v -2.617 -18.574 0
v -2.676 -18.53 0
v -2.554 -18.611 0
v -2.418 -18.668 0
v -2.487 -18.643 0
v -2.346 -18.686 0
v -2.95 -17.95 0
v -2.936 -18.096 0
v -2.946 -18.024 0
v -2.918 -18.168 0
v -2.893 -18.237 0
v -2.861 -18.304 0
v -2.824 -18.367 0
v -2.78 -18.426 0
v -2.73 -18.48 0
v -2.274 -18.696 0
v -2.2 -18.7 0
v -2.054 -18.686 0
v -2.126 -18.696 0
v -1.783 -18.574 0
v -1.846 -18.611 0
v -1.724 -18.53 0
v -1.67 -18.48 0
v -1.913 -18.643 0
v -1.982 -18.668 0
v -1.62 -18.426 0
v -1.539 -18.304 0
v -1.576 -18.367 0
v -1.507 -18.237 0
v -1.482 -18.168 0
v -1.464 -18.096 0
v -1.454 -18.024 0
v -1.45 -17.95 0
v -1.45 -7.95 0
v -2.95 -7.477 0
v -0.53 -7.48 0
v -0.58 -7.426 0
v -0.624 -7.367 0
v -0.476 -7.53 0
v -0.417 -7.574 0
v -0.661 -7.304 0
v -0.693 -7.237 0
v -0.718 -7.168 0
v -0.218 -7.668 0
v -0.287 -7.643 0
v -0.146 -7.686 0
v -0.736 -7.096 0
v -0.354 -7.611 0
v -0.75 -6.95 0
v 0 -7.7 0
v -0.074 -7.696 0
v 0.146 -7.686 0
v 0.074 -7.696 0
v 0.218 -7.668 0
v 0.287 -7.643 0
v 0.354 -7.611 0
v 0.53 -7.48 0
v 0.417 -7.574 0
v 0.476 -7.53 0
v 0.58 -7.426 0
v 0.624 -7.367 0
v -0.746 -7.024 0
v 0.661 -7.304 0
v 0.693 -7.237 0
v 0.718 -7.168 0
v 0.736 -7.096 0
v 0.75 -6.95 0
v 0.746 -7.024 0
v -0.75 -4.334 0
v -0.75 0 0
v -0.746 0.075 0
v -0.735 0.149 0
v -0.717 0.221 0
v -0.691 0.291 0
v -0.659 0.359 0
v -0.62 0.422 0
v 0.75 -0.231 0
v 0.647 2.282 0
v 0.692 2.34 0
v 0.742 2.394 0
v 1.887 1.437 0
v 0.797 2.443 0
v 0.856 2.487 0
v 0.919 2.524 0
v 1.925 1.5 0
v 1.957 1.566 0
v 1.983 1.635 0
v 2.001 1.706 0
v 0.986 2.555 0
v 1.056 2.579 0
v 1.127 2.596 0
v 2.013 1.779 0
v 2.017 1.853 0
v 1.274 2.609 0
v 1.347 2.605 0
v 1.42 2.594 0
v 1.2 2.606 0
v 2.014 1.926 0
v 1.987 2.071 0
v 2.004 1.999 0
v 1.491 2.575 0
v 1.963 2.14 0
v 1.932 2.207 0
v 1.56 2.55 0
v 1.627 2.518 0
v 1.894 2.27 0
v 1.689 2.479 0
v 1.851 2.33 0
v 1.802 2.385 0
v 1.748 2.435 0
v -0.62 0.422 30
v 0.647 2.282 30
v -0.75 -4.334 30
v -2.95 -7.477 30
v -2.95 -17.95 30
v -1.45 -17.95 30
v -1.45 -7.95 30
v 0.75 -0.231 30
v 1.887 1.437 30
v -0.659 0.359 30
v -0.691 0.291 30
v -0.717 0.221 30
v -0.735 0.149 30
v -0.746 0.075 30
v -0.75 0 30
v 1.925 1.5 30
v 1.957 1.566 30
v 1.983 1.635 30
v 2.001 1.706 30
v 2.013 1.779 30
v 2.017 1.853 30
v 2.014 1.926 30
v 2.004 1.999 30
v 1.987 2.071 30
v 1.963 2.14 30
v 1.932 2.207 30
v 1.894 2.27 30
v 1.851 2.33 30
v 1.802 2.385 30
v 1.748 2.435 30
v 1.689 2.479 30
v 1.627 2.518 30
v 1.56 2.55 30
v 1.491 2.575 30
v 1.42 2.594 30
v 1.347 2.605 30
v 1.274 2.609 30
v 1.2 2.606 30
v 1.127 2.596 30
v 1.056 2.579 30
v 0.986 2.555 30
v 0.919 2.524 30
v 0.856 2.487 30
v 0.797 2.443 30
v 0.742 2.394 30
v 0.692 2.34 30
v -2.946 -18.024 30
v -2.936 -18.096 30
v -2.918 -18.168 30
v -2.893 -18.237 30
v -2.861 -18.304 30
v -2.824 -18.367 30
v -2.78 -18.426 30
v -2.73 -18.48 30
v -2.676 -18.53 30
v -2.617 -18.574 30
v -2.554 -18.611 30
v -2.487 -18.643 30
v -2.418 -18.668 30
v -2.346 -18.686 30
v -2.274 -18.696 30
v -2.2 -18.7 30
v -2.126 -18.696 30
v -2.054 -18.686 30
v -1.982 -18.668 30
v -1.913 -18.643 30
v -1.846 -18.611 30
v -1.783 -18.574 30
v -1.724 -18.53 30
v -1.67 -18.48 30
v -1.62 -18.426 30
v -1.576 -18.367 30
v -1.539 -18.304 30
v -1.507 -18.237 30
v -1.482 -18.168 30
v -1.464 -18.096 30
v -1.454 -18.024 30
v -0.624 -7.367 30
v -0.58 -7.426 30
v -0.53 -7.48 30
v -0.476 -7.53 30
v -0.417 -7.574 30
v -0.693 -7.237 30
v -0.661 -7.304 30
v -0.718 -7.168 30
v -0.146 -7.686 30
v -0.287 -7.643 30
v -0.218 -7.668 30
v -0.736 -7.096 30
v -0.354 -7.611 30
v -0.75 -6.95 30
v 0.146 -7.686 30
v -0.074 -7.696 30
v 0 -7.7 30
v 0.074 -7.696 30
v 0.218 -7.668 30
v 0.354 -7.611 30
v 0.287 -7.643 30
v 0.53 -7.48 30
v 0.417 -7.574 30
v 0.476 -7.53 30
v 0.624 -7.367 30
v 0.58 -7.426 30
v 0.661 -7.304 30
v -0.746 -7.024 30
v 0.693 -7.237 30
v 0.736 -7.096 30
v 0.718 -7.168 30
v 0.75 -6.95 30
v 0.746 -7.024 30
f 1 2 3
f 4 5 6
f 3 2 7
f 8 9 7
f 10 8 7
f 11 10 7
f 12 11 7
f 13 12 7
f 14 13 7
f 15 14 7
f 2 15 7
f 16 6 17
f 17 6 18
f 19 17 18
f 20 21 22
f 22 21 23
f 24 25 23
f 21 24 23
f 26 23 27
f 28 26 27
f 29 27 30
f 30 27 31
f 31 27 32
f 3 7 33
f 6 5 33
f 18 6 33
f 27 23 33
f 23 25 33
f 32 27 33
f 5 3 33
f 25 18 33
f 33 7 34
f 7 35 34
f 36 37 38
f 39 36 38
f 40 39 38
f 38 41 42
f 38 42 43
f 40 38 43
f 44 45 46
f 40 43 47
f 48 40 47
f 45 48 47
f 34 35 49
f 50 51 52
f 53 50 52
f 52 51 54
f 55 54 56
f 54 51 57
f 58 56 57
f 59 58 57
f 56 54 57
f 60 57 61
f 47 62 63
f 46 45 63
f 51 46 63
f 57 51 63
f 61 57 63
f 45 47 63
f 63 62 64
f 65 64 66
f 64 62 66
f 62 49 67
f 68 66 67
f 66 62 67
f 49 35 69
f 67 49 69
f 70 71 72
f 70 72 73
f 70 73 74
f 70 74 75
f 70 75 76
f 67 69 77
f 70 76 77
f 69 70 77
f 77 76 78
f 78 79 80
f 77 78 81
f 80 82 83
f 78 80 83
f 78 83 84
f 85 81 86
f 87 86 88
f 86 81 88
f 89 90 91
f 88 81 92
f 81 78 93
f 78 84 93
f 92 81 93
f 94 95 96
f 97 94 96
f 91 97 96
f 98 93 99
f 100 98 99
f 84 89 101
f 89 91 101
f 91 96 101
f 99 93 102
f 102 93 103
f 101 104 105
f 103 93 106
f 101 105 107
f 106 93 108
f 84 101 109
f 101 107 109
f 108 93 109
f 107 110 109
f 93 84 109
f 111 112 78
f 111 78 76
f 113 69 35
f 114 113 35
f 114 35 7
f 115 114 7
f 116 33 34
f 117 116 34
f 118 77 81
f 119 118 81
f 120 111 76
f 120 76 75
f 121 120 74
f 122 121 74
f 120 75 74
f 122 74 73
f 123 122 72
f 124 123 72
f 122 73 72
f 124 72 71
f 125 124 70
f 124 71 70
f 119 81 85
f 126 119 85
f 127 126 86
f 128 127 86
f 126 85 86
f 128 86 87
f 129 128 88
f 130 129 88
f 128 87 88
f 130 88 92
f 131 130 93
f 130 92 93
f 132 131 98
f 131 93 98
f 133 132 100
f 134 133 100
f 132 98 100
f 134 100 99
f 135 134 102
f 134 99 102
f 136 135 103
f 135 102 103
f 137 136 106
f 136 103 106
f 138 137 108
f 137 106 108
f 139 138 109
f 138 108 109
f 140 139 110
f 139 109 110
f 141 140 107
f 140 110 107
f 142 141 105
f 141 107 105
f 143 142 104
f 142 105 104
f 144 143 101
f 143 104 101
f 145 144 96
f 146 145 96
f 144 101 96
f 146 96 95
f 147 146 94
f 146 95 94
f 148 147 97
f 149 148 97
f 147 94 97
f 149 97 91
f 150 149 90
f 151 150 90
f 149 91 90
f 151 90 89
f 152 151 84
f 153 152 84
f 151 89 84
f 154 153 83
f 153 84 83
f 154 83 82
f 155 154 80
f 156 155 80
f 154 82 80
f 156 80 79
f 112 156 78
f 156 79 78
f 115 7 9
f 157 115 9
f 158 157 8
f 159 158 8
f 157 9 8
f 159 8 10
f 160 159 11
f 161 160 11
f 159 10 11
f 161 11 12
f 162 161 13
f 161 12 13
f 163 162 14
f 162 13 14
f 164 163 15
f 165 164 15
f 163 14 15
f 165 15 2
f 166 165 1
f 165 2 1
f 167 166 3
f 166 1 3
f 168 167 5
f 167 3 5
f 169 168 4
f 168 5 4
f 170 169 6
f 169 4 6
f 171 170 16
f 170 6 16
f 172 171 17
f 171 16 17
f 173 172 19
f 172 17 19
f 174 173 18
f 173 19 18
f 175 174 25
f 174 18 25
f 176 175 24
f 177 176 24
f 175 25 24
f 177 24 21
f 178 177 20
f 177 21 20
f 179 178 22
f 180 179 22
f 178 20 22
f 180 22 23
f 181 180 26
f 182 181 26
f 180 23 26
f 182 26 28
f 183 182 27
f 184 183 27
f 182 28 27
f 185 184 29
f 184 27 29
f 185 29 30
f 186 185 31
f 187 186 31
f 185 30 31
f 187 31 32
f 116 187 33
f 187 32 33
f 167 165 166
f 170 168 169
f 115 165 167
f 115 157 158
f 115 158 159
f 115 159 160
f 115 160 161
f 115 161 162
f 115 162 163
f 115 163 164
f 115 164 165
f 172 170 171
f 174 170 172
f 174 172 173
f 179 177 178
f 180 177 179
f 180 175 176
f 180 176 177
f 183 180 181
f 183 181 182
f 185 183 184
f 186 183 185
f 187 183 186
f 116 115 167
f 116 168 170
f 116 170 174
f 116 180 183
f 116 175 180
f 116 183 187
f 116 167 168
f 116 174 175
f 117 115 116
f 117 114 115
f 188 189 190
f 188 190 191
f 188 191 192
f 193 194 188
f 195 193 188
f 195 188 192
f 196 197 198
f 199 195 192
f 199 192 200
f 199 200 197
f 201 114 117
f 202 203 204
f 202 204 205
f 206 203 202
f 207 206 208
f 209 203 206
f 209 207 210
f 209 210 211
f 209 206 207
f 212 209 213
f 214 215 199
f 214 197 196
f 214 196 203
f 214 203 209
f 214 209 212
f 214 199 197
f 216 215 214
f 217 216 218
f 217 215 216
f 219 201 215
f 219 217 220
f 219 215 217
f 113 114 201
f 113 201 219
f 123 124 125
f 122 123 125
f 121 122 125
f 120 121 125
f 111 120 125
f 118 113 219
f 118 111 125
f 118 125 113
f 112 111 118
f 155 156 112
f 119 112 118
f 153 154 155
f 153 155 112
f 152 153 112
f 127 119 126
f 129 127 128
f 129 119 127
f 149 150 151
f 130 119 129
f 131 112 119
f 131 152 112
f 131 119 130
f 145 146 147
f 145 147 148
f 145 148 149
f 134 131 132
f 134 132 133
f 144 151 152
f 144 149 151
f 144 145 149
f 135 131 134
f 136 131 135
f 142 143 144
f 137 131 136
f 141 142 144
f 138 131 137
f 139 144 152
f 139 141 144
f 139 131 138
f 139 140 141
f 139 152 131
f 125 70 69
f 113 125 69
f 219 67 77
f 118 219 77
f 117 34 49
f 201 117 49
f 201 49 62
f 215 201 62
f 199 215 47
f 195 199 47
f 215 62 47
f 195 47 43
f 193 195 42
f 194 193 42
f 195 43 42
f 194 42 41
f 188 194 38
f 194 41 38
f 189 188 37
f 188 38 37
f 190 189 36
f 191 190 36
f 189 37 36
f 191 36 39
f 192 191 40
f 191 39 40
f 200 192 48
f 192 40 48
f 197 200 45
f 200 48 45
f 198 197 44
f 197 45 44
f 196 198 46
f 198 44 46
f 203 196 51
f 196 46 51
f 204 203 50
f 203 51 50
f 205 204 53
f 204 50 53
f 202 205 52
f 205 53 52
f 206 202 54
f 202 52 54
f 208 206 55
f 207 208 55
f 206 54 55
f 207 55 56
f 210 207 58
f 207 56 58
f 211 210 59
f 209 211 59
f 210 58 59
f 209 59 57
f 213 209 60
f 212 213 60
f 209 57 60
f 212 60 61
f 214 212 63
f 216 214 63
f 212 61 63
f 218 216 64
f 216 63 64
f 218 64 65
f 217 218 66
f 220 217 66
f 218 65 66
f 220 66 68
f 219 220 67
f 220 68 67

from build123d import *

# Parameters (mm, degrees)
F2_DEPTH = 30
F3_DEPTH = 30


with BuildPart() as f2:
    # F0 (on Top) → F2 (new body)
    with BuildSketch(Plane.XY):
        with BuildLine():
            ThreePointArc((-0.619784, 0.422336), (-0.716707, 0.220977), (-0.75, 0))
            Line((-0.75, 0), (-0.75, -6.95))
            ThreePointArc((-0.75, -6.95), (0, -7.7), (0.75, -6.95))
            Line((0.75, -6.95), (0.75, -0.231242))
            Line((0.75, -0.231242), (1.886792, 1.437017))
            ThreePointArc((1.886792, 1.437017), (1.689343, 2.479137), (0.647223, 2.281688))
            Line((0.647223, 2.281688), (-0.619784, 0.422336))
        make_face()
    extrude(amount=F2_DEPTH)

    # F1 (on Top) → F3 (join, through all)
    with BuildSketch(Plane.XY):
        with BuildLine():
            Line((-1.45, -17.95), (-1.45, -7.95))
            Line((-1.45, -7.95), (-0.75, -6.95))
            Line((-0.75, -6.95), (-0.75, -4.33431))
            Line((-0.75, -4.33431), (-2.95, -7.477167))
            Line((-2.95, -7.477167), (-2.95, -17.95))
            ThreePointArc((-2.95, -17.95), (-2.2, -18.7), (-1.45, -17.95))
        make_face()
    extrude(amount=F3_DEPTH)


solid = f2.part
